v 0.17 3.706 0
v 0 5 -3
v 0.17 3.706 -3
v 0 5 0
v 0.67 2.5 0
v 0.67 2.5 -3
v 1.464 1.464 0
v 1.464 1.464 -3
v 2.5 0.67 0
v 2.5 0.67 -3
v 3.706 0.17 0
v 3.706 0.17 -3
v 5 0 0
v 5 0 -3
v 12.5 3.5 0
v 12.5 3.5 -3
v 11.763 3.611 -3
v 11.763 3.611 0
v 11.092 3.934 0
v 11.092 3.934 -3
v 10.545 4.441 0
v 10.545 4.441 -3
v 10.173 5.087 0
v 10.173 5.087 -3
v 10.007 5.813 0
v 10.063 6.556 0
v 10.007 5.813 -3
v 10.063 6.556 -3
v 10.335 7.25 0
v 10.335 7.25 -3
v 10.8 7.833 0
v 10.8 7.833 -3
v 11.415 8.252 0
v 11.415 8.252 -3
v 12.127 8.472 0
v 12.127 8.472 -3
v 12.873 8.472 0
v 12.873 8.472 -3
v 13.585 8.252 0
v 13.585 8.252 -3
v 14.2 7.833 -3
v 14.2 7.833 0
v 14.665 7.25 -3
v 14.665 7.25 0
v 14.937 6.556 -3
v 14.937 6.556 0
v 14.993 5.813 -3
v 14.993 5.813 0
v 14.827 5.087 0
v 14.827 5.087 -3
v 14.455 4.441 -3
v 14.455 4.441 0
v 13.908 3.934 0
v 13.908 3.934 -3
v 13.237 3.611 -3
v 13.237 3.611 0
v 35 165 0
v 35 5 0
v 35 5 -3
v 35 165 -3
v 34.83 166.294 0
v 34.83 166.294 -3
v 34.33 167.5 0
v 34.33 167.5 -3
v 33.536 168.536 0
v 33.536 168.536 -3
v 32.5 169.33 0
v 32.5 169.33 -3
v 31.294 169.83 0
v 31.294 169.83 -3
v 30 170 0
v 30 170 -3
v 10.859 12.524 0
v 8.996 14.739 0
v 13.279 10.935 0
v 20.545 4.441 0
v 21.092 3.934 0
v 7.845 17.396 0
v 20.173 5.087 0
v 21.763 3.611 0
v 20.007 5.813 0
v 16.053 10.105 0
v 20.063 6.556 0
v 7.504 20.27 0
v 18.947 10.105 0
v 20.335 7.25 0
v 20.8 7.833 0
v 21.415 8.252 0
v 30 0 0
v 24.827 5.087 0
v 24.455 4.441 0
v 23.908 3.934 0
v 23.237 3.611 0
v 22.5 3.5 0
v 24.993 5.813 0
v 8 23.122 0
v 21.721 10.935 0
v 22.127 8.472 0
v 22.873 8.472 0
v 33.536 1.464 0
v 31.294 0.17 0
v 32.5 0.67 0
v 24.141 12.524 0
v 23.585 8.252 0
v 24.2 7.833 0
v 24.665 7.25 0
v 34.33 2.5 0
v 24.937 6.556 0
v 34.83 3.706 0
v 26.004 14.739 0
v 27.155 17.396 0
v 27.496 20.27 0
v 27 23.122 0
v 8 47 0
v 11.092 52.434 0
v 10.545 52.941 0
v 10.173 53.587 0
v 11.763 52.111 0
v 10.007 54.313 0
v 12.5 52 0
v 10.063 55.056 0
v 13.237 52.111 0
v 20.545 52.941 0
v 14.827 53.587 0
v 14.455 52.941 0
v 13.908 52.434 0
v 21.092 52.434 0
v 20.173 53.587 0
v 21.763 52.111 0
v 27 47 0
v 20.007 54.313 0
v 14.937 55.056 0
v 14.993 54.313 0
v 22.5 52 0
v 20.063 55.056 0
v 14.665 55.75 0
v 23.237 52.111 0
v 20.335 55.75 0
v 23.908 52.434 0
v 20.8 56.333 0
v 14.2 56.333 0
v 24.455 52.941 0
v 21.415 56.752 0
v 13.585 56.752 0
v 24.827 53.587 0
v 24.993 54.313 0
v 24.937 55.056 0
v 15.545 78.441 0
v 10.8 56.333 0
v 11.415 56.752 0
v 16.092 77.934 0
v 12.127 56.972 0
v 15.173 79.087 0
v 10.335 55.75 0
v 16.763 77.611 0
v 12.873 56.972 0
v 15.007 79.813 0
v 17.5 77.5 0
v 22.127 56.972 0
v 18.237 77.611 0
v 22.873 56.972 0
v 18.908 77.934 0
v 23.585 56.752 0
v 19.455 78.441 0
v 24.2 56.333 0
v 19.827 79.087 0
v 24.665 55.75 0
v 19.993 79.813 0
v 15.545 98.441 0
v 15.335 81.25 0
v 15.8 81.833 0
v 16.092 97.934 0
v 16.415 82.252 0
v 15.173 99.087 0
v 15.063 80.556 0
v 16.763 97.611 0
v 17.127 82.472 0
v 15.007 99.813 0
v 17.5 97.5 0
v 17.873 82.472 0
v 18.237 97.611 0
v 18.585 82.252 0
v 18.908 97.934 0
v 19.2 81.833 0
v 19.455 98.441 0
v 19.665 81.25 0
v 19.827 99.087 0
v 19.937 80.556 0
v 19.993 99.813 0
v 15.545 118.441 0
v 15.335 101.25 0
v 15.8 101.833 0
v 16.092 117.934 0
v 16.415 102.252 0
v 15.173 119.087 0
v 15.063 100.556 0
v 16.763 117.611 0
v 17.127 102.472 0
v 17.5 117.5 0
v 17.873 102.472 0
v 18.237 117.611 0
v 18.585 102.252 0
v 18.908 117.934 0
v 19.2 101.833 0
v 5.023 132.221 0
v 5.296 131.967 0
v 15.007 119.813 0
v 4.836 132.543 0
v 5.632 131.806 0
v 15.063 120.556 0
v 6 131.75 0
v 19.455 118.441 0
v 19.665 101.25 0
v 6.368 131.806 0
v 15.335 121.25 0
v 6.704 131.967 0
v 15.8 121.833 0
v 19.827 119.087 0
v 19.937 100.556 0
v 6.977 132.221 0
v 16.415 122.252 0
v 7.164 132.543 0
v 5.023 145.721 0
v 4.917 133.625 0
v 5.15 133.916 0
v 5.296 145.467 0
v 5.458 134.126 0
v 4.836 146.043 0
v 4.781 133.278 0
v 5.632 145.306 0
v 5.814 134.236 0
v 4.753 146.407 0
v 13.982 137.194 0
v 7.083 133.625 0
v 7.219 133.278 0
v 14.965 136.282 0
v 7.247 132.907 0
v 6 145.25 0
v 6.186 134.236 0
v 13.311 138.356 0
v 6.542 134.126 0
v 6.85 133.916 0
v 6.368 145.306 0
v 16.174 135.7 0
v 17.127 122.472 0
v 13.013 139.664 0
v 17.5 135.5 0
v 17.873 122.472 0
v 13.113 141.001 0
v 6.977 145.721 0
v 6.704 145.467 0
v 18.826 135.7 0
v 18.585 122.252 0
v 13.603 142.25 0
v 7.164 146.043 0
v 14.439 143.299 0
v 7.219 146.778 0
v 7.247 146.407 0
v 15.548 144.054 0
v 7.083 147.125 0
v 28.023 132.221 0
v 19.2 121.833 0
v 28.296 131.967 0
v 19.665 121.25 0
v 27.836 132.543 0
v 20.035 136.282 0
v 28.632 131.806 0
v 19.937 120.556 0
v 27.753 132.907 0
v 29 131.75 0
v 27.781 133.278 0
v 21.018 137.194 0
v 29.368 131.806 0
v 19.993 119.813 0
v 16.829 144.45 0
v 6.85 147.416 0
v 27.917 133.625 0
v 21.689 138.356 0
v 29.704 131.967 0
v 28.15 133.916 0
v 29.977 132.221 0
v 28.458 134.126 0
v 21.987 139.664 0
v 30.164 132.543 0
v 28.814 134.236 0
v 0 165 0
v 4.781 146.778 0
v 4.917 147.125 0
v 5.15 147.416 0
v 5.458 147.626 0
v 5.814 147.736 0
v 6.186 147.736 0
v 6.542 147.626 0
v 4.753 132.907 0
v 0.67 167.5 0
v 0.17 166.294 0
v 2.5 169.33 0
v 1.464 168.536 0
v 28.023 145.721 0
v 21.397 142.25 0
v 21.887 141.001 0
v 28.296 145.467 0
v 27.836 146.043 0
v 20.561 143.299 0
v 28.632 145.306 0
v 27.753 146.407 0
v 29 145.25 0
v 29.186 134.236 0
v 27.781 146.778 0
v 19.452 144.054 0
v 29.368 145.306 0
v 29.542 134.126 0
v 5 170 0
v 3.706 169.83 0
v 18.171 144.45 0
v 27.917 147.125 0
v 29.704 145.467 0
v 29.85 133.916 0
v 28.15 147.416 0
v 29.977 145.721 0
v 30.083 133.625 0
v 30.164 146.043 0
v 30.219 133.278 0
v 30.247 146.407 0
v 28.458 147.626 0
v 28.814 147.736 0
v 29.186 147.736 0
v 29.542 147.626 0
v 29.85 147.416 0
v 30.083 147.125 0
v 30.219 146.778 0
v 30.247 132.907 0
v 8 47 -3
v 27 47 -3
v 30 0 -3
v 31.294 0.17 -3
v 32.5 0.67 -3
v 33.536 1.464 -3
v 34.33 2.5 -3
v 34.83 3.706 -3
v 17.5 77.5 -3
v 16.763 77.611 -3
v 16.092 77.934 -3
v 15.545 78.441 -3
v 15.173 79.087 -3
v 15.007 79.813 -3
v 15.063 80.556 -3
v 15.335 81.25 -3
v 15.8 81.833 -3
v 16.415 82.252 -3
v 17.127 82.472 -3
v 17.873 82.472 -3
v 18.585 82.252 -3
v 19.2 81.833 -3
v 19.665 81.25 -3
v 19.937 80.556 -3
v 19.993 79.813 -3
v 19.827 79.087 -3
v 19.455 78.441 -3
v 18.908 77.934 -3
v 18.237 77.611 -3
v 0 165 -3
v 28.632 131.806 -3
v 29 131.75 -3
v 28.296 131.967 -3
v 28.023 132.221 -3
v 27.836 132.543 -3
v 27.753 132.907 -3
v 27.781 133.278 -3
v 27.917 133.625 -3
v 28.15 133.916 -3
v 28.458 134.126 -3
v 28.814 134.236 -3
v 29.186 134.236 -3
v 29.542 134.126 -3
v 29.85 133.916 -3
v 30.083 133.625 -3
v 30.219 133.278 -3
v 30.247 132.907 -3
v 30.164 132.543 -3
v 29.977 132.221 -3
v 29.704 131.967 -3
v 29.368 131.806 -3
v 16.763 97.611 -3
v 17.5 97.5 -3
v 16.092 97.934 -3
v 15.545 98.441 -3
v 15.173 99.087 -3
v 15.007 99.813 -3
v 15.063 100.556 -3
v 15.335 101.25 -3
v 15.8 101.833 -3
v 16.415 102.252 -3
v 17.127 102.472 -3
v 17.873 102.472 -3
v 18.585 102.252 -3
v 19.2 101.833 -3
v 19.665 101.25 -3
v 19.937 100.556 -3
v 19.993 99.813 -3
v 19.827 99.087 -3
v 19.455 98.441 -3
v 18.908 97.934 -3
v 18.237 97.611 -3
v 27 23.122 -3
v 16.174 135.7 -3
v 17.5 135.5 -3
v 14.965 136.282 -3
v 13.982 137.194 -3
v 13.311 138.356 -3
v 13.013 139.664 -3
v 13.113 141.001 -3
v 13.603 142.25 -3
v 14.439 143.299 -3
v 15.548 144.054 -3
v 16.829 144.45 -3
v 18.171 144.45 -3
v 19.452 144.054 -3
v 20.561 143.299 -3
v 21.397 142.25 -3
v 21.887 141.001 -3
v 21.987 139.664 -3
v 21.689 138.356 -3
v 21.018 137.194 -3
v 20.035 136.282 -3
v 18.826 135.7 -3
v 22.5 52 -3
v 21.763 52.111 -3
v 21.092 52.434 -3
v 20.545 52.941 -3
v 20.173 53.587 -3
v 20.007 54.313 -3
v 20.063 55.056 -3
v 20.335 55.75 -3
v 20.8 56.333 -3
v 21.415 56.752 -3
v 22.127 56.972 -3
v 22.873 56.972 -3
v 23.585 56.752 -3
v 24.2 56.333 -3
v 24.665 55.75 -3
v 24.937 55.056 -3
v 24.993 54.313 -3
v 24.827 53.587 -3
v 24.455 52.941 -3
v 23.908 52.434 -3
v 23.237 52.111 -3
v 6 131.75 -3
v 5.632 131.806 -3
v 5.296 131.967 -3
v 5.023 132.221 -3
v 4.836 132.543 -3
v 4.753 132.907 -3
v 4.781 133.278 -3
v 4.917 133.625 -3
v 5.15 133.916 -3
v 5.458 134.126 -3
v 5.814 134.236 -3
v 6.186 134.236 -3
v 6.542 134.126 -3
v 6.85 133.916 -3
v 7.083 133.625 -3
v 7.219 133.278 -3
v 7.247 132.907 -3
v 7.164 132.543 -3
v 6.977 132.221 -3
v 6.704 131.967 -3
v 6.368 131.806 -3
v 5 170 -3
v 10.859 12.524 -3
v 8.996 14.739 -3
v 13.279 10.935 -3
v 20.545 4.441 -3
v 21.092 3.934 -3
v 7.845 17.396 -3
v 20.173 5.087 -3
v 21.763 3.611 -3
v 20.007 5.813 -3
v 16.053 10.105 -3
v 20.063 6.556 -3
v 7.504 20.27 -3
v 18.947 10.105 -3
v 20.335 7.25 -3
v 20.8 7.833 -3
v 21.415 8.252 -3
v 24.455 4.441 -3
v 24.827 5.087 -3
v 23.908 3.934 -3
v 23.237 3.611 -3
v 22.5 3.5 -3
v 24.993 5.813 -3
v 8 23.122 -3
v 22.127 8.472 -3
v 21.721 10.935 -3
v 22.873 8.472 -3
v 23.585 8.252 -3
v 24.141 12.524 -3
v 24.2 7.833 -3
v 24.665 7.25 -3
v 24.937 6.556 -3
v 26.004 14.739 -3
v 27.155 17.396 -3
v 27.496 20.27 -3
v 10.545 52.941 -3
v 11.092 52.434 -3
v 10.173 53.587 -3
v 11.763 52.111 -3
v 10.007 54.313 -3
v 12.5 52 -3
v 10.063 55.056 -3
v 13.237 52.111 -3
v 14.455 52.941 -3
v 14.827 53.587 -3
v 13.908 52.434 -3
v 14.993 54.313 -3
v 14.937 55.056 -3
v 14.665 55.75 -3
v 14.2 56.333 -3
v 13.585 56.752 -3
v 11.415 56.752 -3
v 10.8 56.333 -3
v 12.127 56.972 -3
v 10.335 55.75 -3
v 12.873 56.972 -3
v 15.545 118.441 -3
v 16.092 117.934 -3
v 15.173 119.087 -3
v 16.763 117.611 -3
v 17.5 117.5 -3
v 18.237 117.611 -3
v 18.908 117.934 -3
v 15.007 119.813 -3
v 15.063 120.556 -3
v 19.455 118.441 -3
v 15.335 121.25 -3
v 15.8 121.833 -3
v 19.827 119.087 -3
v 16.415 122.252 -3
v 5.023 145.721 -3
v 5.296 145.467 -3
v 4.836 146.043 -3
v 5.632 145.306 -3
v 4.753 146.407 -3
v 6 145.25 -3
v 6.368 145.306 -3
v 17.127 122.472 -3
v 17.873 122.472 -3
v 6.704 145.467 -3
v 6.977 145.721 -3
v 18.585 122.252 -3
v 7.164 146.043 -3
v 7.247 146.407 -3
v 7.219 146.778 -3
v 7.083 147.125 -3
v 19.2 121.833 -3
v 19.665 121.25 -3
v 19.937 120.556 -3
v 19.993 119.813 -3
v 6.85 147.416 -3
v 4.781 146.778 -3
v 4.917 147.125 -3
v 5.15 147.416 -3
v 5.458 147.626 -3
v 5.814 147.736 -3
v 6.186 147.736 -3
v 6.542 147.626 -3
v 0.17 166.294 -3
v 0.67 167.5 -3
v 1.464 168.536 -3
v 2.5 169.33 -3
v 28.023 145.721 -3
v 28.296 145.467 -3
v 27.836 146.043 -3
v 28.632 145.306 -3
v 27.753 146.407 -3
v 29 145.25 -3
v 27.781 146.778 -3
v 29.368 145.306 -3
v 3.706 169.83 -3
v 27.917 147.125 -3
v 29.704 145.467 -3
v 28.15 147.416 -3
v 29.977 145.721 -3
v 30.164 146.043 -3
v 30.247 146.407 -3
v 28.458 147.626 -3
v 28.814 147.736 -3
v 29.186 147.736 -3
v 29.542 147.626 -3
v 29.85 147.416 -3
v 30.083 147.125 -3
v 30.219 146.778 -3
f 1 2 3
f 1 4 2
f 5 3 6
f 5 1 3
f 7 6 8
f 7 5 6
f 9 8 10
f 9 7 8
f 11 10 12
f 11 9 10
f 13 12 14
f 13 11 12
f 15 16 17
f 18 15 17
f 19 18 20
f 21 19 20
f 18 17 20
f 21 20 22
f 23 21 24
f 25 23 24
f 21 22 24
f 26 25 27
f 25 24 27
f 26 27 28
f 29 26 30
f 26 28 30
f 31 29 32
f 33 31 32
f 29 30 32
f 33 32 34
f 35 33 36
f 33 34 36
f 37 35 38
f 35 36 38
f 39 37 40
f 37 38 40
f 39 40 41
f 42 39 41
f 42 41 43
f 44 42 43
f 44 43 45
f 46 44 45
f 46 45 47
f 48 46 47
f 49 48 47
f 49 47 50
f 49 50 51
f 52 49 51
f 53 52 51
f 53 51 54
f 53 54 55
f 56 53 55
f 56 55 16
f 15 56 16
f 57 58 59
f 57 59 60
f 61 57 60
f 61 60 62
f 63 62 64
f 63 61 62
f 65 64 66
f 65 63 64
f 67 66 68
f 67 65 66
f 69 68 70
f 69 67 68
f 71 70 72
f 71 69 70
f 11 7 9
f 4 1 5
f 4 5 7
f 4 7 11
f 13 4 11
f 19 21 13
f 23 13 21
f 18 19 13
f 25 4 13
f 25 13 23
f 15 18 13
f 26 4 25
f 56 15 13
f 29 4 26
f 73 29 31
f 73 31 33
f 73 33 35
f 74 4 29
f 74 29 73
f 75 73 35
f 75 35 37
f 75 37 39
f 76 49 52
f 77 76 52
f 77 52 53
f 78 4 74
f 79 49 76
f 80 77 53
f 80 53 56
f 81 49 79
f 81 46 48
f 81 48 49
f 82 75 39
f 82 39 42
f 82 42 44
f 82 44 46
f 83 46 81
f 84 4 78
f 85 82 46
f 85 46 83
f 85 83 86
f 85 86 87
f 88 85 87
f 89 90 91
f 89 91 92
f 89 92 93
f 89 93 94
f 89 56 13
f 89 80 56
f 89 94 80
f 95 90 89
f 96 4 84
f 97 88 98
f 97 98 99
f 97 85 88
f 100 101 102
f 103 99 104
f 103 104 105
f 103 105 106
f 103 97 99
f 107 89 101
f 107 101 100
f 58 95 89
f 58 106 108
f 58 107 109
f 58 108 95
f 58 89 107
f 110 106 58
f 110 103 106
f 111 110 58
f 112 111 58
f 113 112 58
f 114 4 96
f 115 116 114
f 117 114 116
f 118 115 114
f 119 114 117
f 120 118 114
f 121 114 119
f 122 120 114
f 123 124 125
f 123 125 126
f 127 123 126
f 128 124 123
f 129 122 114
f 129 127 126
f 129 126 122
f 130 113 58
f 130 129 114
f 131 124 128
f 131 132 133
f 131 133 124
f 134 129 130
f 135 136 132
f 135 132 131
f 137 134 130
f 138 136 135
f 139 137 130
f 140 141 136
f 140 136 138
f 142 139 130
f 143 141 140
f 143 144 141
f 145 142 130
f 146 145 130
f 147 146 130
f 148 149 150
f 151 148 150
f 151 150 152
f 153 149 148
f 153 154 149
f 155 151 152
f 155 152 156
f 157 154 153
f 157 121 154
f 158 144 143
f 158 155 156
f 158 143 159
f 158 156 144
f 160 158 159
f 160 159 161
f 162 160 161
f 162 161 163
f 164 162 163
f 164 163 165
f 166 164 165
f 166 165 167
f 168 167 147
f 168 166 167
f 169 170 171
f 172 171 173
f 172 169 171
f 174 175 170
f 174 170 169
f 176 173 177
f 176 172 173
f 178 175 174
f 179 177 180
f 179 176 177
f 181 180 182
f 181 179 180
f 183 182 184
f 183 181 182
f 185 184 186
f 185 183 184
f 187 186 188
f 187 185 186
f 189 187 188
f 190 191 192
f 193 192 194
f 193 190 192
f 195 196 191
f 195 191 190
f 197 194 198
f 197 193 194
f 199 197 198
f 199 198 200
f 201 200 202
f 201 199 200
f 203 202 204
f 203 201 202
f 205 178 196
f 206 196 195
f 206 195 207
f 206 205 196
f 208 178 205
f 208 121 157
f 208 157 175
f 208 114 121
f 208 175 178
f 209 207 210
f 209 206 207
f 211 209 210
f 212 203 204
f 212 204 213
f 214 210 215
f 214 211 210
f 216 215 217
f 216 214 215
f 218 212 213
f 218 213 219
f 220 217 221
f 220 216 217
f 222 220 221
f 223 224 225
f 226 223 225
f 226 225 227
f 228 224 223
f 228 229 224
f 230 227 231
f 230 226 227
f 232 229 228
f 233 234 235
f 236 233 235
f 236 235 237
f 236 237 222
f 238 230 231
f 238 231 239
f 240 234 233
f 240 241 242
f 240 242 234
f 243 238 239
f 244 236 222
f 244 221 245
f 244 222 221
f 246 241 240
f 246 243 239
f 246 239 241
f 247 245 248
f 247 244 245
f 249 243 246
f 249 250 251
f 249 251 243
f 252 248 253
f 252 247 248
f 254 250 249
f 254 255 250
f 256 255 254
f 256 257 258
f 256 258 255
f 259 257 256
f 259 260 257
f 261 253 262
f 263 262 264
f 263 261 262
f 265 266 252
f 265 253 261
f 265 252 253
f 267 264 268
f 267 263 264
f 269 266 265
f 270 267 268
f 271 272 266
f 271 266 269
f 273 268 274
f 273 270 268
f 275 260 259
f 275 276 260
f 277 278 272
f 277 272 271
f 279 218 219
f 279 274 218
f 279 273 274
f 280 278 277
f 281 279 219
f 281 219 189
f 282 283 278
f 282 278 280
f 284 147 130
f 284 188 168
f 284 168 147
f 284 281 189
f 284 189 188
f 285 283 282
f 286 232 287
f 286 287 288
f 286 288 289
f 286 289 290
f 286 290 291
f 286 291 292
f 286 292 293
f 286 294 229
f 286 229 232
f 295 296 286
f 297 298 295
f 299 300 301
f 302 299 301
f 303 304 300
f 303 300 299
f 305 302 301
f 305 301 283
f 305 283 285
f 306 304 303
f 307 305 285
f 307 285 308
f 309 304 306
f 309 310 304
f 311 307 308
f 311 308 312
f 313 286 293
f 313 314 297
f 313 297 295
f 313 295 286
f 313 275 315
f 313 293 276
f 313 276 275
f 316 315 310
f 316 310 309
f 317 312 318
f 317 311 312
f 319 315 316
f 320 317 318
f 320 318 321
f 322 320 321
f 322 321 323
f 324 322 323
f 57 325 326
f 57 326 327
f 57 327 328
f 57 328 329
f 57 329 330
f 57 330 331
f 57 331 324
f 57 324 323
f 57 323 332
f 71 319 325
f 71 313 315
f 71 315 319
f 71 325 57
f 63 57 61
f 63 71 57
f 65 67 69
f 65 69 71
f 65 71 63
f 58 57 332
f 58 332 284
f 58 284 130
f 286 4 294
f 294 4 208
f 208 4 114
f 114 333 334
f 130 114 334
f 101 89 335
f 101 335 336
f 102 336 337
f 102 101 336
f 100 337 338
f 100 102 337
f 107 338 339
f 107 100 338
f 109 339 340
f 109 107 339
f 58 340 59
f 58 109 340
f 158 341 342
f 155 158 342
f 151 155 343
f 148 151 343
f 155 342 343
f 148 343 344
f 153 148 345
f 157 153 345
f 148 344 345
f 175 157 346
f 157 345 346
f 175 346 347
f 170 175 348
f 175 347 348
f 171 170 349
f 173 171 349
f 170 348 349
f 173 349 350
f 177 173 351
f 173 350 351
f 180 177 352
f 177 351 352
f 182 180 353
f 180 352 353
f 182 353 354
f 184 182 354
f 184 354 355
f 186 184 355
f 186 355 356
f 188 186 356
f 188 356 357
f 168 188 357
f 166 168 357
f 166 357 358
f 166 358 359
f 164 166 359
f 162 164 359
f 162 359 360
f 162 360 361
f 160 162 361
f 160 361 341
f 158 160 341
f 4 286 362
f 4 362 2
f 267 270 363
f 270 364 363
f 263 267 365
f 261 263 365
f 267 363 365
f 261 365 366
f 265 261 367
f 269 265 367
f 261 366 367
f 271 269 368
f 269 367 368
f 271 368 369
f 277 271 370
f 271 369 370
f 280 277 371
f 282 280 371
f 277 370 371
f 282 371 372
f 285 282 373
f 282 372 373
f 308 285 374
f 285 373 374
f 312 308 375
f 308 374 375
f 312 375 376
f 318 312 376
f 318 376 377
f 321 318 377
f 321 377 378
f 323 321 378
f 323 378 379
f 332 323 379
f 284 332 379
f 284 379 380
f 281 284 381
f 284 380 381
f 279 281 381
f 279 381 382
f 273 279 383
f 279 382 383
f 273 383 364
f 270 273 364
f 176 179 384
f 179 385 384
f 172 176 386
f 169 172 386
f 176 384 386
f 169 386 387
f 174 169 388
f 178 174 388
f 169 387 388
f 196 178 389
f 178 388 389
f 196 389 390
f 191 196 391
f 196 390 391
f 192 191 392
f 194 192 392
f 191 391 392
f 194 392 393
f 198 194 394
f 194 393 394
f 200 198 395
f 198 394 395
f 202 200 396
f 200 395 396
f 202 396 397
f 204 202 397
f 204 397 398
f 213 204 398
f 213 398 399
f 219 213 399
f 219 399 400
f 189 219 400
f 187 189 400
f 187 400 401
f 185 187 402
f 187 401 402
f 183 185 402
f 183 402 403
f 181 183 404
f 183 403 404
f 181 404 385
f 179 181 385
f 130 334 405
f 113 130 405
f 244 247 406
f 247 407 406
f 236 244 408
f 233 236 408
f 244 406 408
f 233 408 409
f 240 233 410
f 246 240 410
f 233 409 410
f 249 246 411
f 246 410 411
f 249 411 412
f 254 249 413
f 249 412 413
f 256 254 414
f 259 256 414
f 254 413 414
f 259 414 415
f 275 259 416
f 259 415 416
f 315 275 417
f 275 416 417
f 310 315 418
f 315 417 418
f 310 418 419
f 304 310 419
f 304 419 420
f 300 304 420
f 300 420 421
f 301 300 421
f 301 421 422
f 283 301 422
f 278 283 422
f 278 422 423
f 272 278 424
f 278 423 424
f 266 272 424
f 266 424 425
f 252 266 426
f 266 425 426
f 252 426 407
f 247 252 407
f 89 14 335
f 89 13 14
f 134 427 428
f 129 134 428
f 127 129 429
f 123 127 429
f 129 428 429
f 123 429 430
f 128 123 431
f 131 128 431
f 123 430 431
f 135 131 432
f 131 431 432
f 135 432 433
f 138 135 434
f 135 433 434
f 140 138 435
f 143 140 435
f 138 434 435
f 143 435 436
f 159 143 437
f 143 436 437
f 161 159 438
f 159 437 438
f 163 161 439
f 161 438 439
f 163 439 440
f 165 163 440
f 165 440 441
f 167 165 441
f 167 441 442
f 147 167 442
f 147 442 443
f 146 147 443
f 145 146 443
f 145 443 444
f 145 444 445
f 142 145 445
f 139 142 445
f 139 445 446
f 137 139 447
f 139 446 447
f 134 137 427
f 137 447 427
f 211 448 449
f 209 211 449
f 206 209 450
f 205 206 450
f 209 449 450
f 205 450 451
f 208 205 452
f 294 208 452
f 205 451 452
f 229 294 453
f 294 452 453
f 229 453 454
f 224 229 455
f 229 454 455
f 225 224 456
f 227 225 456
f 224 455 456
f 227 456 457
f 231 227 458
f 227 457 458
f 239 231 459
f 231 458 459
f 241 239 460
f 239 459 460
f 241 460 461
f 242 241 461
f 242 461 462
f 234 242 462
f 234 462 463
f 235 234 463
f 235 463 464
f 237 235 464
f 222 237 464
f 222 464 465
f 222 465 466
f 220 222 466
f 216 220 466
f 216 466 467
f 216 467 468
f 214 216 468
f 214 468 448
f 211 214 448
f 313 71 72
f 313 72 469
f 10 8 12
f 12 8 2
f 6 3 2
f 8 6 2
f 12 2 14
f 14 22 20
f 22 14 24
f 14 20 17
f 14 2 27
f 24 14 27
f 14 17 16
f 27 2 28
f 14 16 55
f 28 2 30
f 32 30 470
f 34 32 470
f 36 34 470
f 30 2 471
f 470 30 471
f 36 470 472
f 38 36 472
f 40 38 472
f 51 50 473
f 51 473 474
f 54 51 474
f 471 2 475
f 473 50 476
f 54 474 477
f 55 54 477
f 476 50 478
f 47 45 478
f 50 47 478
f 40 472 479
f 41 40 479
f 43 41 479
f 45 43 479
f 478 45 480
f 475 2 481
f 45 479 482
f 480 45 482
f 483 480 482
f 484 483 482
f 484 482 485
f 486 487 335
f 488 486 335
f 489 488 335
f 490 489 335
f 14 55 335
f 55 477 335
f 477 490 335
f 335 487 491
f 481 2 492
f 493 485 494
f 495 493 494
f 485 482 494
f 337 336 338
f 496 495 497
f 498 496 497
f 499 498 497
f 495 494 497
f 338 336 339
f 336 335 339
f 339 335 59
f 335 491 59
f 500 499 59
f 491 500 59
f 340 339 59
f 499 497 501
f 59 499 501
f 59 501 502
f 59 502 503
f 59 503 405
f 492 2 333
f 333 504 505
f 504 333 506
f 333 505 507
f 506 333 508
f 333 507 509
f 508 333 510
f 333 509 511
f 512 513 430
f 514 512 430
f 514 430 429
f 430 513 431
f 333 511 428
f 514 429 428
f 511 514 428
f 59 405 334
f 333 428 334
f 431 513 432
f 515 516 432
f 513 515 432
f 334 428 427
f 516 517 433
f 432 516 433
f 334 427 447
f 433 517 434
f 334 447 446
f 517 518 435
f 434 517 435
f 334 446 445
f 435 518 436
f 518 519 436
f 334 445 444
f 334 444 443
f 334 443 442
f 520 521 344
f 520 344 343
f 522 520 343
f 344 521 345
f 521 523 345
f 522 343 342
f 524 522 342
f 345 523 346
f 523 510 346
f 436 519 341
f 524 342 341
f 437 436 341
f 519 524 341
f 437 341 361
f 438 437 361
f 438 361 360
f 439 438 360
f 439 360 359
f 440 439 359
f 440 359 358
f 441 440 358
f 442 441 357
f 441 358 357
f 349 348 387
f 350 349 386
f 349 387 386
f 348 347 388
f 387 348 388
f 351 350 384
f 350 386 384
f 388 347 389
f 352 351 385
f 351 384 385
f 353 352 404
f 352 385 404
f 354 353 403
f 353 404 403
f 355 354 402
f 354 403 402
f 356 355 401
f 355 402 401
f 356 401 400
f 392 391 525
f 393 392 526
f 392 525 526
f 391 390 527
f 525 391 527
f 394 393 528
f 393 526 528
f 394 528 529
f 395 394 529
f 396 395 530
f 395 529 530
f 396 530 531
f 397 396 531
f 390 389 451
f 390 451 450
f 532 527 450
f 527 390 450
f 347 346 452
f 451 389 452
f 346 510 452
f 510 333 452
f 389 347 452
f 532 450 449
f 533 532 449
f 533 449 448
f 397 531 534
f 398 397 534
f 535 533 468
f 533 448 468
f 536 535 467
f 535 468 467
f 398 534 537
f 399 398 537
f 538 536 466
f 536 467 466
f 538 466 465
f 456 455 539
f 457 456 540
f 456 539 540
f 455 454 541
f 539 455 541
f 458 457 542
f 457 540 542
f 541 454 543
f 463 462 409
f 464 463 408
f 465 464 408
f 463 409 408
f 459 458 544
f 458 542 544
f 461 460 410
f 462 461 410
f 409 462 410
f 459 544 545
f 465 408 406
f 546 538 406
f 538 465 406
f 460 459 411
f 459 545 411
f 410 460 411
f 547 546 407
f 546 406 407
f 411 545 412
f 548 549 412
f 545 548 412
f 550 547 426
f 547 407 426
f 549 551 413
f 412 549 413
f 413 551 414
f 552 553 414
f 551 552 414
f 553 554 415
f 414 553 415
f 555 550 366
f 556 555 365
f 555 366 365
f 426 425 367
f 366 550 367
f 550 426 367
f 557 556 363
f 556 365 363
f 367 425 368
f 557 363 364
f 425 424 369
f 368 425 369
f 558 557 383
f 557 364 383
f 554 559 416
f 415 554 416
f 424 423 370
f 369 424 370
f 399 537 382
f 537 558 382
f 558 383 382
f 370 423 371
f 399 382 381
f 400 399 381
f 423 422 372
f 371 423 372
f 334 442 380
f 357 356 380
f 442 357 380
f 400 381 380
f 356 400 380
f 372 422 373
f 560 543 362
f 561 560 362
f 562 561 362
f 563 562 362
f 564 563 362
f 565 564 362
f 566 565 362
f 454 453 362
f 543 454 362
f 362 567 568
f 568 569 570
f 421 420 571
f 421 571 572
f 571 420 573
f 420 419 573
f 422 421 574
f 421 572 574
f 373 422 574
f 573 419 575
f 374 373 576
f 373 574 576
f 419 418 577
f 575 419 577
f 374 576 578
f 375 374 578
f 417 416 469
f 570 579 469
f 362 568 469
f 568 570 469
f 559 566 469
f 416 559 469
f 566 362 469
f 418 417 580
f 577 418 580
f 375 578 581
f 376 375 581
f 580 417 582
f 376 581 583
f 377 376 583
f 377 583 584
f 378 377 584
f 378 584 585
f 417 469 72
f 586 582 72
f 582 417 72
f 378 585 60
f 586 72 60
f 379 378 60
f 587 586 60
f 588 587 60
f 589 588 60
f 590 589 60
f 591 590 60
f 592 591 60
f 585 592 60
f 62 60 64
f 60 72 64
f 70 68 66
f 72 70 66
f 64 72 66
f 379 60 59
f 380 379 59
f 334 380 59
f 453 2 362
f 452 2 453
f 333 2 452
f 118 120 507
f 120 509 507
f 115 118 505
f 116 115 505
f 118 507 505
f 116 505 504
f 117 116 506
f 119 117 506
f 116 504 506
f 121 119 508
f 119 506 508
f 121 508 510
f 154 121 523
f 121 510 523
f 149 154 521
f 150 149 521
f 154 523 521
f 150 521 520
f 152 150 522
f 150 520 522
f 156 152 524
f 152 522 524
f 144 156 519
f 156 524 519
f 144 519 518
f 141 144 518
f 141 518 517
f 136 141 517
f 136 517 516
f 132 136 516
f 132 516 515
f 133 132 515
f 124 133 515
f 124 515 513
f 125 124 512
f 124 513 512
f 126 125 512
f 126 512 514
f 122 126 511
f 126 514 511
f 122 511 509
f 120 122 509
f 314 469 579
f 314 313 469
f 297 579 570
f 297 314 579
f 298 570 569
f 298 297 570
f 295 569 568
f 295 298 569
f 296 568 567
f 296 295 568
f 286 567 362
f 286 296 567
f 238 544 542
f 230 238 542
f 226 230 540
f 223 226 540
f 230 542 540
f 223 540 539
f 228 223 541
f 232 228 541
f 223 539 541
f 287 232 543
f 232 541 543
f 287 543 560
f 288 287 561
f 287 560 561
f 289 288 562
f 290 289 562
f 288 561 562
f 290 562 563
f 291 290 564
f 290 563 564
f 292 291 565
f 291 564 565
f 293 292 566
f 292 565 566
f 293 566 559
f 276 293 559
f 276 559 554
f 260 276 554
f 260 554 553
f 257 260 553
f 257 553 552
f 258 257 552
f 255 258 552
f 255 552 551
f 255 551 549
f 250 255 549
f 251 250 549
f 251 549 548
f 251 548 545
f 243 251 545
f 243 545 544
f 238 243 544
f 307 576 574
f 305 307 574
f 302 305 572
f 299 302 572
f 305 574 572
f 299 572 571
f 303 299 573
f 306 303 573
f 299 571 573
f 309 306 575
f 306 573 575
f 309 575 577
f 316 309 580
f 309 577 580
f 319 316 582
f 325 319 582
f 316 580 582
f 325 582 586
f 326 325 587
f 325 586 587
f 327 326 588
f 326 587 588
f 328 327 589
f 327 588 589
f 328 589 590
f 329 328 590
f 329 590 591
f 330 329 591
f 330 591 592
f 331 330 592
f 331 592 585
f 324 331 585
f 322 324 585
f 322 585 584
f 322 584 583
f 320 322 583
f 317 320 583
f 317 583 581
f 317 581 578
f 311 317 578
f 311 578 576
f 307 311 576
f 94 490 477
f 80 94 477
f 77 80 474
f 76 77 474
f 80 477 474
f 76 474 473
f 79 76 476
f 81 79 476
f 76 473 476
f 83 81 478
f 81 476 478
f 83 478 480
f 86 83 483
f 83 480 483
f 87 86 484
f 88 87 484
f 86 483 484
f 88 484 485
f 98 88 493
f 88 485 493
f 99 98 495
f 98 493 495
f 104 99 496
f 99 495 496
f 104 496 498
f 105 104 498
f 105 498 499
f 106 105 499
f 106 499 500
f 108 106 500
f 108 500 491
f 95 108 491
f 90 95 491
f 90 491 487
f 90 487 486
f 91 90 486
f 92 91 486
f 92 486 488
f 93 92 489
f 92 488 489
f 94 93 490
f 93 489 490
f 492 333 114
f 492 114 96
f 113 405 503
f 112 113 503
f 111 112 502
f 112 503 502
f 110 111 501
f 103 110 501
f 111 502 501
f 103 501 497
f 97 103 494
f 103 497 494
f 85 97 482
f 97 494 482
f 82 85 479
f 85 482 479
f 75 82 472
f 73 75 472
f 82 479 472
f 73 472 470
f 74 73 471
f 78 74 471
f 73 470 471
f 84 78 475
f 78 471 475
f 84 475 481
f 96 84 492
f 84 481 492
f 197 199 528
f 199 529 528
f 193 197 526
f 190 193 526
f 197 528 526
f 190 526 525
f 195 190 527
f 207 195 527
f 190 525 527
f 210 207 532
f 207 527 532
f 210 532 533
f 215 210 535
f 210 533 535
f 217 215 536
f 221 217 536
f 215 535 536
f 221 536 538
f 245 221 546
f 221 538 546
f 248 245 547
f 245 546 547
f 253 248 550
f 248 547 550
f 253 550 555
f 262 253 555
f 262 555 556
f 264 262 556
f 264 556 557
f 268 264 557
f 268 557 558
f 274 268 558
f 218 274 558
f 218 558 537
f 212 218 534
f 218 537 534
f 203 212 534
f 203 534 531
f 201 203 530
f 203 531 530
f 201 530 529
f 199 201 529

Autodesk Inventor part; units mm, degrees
ref_plane "YZ Plane" through (0, 0, 0) normal (1, 0, 0) x (0, 1, 0)
ref_plane "XZ Plane" through (0, 0, 0) normal (0, 1, 0) x (-1, 0, 0)
ref_plane "XY Plane" through (0, 0, 0) normal (0, 0, 1) x (1, 0, 0)
sketch "Boceto1" plane through (0, 0, 0) normal (0, 0, 1) x (1, 0, 0)
  line L0 (5, 0) -> (30, 0)
  line L1 (35, 5) -> (35, 165)
  line L2 (30, 170) -> (5, 170)
  line L3 (0, 165) -> (0, 5)
  arc A0 (35, 165) -> (30, 170) centre (30, 165) ccw
  arc A1 (5, 170) -> (0, 165) centre (5, 165) ccw
  arc A2 (30, 0) -> (35, 5) centre (30, 5) ccw
  arc A3 (0, 5) -> (5, 0) centre (5, 5) ccw
extrude "Extrusión1" add sketch "Boceto1" against normal blind 3
sketch "Boceto2" plane through (0, 0, 0) normal (0, 0, 1) x (1, 0, 0)
  circle A0 centre (17.5, 140) radius 4.5
  circle A1 centre (29, 146.5) radius 1.25
  circle A2 centre (6, 146.5) radius 1.25
  circle A3 centre (6, 133) radius 1.25
  circle A4 centre (29, 133) radius 1.25
  circle A5 centre (17.5, 120) radius 2.5
  circle A6 centre (17.5, 100) radius 2.5
  circle A7 centre (17.5, 80) radius 2.5
  circle A8 centre (17.5, 20) radius 6.5
  circle A9 centre (12.5, 6) radius 2.5
  circle A10 centre (22.5, 6) radius 2.5
  circle A11 centre (12.5, 54.5) radius 2.5
  circle A12 centre (22.5, 54.5) radius 2.5
  point P0 (0, 0)
hole "Agujero1" at (17.5, 140, 0) direction (0, 0, -1) diameter 9 end through all
hole "Agujero2" at (29, 133, 0) at (29, 146.5, 0) at (6, 133, 0) at (6, 146.5, 0) direction (0, 0, -1) diameter 2.5 end through all
hole "Agujero3" at (17.5, 120, 0) at (17.5, 100, 0) at (17.5, 80, 0) at (22.5, 54.5, 0) at (12.5, 54.5, 0) at (22.5, 6, 0) at (12.5, 6, 0) direction (0, 0, -1) diameter 5 end through all
hole "Agujero4" at (17.5, 20, 0) direction (0, 0, -1) diameter 13 end through all
sketch "Boceto3" plane through (0, 0, -3) normal (0, 0, -1) x (-1, 0, 0)
  circle A0 centre (-17.5, 20) radius 6.5 projected
  arc A1 (-27, 23.1225) -> (-8, 23.1225) centre (-17.5, 20) ccw
  line L0 (-17.5, 47) -> (-27, 47)
  line L1 (-17.5, 47) -> (-8, 47)
  line L2 (-8, 47) -> (-8, 23.1225)
  line L3 (-27, 47) -> (-27, 23.1225)
  point P0 (0, 0)
extrude "Extrusión2" cut sketch "Boceto3" against normal blind 10 contours A0 | L3 L0 L1 L2 A1
properties part number "1"
